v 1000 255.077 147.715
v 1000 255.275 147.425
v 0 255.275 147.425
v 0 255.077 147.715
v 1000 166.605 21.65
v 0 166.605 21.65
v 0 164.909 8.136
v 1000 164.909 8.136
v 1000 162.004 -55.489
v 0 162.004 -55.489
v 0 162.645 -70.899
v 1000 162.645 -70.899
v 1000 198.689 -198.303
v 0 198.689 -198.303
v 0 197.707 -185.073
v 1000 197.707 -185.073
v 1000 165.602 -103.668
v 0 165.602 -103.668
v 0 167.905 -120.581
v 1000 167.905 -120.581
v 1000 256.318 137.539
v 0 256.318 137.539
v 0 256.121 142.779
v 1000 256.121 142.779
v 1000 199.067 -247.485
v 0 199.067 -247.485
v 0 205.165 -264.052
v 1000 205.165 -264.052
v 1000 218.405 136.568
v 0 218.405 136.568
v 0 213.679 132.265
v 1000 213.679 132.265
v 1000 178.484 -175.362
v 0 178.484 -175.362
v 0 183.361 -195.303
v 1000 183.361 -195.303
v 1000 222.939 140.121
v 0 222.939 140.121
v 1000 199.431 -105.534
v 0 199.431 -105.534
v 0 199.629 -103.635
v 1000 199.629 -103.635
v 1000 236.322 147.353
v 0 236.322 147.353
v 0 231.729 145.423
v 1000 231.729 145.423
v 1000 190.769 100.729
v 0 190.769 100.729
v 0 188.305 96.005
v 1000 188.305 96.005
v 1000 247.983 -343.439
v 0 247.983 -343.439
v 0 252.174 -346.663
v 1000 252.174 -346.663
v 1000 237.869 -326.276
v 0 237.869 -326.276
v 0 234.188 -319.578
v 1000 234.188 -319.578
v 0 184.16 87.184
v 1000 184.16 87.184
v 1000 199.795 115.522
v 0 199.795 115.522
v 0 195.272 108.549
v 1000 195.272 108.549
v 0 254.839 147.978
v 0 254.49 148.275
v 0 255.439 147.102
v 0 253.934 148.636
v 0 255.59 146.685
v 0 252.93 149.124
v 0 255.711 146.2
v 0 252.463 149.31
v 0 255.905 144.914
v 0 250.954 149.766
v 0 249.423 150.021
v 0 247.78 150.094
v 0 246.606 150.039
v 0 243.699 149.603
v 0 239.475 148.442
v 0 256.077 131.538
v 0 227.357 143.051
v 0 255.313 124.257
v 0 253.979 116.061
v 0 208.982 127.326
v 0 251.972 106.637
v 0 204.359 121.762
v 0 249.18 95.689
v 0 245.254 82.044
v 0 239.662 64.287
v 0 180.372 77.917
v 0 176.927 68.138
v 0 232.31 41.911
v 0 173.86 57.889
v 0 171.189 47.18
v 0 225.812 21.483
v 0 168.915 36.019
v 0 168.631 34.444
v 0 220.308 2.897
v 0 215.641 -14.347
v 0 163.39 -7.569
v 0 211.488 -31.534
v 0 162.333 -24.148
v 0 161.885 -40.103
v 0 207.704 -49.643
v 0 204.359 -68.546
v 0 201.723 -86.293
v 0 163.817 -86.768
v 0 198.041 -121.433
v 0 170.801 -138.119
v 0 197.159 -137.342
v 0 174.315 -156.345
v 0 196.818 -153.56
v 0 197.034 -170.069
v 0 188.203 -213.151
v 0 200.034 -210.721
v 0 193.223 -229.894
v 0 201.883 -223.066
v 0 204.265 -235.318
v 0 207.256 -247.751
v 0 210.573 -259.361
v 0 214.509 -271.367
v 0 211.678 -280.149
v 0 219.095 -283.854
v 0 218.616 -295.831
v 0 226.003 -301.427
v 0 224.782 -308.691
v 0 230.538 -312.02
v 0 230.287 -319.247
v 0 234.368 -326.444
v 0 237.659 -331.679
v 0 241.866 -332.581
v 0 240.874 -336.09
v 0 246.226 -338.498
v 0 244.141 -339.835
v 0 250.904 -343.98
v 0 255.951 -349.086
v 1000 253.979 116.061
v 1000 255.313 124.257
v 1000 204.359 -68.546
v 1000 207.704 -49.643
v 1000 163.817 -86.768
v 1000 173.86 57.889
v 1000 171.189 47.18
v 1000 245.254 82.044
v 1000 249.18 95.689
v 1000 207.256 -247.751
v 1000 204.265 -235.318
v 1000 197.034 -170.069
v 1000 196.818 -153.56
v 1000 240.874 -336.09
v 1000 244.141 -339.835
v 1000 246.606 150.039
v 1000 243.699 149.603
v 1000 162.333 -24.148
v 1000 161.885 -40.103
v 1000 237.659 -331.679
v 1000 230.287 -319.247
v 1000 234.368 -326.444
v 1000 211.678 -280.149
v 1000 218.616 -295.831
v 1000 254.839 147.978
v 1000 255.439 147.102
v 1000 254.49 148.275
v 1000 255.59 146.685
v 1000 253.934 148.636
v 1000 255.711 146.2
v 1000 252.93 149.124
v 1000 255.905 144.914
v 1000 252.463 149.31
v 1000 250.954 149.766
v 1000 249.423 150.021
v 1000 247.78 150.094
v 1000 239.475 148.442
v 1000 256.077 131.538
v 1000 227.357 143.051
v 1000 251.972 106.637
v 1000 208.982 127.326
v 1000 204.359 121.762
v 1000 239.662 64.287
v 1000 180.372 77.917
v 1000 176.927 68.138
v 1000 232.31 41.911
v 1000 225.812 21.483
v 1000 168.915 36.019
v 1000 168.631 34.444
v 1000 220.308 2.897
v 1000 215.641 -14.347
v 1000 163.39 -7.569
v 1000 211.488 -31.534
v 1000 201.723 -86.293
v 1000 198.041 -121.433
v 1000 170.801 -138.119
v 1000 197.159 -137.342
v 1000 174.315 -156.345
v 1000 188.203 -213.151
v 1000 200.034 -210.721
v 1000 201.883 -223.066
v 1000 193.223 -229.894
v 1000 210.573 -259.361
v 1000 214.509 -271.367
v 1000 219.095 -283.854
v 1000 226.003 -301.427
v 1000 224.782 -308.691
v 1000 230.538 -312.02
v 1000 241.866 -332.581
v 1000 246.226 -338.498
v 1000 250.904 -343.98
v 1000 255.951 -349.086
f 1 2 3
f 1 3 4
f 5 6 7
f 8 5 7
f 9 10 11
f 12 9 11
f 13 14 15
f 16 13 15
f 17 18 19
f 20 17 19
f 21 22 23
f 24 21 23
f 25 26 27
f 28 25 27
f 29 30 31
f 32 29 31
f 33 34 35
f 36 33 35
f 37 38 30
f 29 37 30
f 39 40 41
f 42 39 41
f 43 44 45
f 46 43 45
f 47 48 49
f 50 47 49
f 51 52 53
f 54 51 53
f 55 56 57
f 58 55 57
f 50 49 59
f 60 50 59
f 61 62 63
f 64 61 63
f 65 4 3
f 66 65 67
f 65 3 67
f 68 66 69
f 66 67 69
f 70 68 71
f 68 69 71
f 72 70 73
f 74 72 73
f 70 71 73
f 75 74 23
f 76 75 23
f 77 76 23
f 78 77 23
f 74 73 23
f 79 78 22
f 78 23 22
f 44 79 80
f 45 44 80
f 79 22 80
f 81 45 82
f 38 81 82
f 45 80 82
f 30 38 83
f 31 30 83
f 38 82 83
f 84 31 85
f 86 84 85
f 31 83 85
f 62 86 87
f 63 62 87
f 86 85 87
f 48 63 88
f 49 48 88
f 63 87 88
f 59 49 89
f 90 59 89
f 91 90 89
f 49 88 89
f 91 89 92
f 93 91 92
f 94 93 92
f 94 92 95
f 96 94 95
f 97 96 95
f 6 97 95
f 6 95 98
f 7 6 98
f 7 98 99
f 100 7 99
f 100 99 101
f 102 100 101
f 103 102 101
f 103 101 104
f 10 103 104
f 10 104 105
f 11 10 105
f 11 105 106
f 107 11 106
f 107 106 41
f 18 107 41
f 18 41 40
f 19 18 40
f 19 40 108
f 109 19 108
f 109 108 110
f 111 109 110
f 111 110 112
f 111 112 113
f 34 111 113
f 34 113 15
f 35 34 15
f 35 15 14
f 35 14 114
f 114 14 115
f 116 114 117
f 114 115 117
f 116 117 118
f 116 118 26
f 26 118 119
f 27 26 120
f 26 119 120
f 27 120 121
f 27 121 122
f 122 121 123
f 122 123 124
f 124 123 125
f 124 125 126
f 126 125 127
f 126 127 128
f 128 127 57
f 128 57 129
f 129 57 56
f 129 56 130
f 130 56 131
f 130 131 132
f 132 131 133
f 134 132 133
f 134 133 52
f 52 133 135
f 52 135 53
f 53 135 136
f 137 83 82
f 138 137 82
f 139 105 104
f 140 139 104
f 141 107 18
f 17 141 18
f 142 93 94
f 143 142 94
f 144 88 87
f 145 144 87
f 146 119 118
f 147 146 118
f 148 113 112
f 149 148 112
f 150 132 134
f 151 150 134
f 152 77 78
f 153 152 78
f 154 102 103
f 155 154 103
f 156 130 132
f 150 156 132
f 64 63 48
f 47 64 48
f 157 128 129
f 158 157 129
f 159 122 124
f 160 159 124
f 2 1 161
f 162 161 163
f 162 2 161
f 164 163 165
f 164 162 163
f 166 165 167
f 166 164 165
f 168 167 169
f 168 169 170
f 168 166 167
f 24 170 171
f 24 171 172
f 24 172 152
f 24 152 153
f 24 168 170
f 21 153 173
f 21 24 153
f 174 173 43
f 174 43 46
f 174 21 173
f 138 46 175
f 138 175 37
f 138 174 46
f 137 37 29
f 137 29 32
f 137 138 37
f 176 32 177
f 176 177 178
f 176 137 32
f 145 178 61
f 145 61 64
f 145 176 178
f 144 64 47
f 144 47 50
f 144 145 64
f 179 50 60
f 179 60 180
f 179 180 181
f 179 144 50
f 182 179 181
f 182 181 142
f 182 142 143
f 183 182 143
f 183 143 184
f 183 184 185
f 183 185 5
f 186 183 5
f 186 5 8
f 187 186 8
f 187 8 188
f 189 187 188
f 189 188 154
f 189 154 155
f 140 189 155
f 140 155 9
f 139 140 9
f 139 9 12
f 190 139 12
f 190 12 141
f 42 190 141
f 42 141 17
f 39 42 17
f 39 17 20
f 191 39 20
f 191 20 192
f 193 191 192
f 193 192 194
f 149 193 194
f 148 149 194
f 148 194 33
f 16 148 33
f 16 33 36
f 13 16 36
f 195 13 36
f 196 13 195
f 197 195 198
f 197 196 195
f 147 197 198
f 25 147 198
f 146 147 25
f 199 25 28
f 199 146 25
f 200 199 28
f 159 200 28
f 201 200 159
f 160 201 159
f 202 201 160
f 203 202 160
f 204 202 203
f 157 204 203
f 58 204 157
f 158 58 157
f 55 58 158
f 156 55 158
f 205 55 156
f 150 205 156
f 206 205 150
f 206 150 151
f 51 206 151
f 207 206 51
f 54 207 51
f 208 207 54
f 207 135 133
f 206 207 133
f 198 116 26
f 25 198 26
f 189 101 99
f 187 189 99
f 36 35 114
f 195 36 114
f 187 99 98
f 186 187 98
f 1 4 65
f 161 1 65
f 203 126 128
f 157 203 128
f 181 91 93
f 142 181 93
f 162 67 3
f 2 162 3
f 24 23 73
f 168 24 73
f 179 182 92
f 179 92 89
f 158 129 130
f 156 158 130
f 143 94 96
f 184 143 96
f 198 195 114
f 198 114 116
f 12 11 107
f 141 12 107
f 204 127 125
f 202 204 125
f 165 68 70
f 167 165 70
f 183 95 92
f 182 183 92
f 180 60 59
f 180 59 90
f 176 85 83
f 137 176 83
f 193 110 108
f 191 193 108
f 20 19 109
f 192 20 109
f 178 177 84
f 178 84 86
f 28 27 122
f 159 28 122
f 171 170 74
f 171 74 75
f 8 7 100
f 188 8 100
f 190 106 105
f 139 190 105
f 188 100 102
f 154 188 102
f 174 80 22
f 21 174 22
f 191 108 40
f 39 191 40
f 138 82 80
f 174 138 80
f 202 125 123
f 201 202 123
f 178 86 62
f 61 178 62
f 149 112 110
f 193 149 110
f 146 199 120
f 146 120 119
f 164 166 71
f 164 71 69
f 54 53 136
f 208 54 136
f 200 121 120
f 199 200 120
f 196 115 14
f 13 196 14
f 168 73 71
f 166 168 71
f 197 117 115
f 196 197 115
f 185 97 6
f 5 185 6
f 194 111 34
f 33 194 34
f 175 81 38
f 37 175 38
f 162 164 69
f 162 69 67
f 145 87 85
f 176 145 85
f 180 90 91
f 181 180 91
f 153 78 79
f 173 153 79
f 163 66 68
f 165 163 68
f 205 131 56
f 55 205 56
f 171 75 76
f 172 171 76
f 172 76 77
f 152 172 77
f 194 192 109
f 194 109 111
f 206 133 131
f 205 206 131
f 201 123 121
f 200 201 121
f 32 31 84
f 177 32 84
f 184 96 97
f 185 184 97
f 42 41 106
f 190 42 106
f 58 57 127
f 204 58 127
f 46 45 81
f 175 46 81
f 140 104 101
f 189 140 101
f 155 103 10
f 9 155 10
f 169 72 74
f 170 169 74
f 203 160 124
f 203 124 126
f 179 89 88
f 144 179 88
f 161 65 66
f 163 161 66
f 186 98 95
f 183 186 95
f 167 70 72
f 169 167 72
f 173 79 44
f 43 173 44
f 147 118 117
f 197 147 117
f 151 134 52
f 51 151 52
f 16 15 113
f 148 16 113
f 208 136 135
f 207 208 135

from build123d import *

# Parameters (mm, degrees)
BOSS_EXTRUDE3_DEPTH = 1000


with BuildPart() as part:
    # Sketch1 → Boss-Extrude3 (new body)
    with BuildSketch(Plane(origin=(0, 0, -500), x_dir=(0, 0, -1), z_dir=(1, 0, 0))):
        Polygon((-642.779409885, 256.120502949), (-644.914388657, 255.904585123), (-646.200299263, 255.71128726), (-646.685421467, 255.589991808), (-647.101521492, 255.439013243), (-647.425472736, 255.27459383), (-647.714614868, 255.077391863), (-647.978484631, 254.839211702), (-648.275375366, 254.489988089), (-648.636221886, 253.934204578), (-649.123728275, 252.929896116), (-649.30999279, 252.462893724), (-649.766325951, 250.954300165), (-650.021493435, 249.423295259), (-650.094270706, 247.779801488), (-650.038719177, 246.605500579), (-649.602711201, 243.699401617), (-648.441672325, 239.474505186), (-647.353470325, 236.322000623), (-645.422577858, 231.728598475), (-643.051326275, 227.357104421), (-640.120506287, 222.93870151), (-636.568427086, 218.405202031), (-632.264912128, 213.678896427), (-627.326071262, 208.981901407), (-621.761500835, 204.359397292), (-615.521609783, 199.795395136), (-608.5485816, 195.271506906), (-600.728929043, 190.76859951), (-596.005380154, 188.305199146), (-587.184429169, 184.160396457), (-577.917218208, 180.371597409), (-568.137705326, 176.927000284), (-557.888925076, 173.8602072), (-547.180473804, 171.18909955), (-536.01872921, 168.915003538), (-534.444212914, 168.630793691), (-521.650195122, 166.604802012), (-508.135974407, 164.908796549), (-492.430597544, 163.390293717), (-475.852102041, 162.333399057), (-459.896713495, 161.8847996), (-444.510787725, 162.004098296), (-429.100692272, 162.644594908), (-413.232386112, 163.816794753), (-396.332412958, 165.601596236), (-379.418700933, 167.905002832), (-361.880987883, 170.800805092), (-343.654692173, 174.315303564), (-324.638485909, 178.4837991), (-304.697185755, 183.361396194), (-286.849200726, 188.203394413), (-270.105808973, 193.222895265), (-252.515107393, 199.067205191), (-235.948398709, 205.165296793), (-219.85130012, 211.677998304), (-204.168900847, 218.616306782), (-191.308796406, 224.782302976), (-180.752694607, 230.286598206), (-173.555895686, 234.368100762), (-168.321296573, 237.659201026), (-163.910001516, 240.874201059), (-160.164996982, 244.140699506), (-156.561002135, 247.982501984), (-153.336599469, 252.174496651), (-150.913998485, 255.951285362), (-156.019702554, 250.904113054), (-161.501795053, 246.226206422), (-167.419299483, 241.865903139), (-173.723697662, 237.868800759), (-180.422201753, 234.187602997), (-187.979504466, 230.538204312), (-198.573499918, 226.002797484), (-216.145798564, 219.094693661), (-228.632703424, 214.508801699), (-240.639105439, 210.572898388), (-252.248704433, 207.256004214), (-264.682114124, 204.265296459), (-276.933789253, 201.882794499), (-289.279103279, 200.03400743), (-301.696509123, 198.68889451), (-314.927399158, 197.707295418), (-329.930603504, 197.033897042), (-346.439599991, 196.817696095), (-362.657696009, 197.159305215), (-378.566503525, 198.04109633), (-394.465506077, 199.431404471), (-396.365493536, 199.629202485), (-413.707196712, 201.723203063), (-431.453704834, 204.358592629), (-450.356990099, 207.704395056), (-468.465685844, 211.488306522), (-485.652685165, 215.641096234), (-502.897024155, 220.307901502), (-521.483182907, 225.811600685), (-541.911184788, 232.310399413), (-564.286708832, 239.661693573), (-582.044124603, 245.254397392), (-595.689117908, 249.179899693), (-606.637179852, 251.971691847), (-616.060674191, 253.978610039), (-624.257326126, 255.313187838), (-631.537616253, 256.076693535), (-637.538611889, 256.317704916), align=None)
    extrude(amount=BOSS_EXTRUDE3_DEPTH)


solid = part.part
